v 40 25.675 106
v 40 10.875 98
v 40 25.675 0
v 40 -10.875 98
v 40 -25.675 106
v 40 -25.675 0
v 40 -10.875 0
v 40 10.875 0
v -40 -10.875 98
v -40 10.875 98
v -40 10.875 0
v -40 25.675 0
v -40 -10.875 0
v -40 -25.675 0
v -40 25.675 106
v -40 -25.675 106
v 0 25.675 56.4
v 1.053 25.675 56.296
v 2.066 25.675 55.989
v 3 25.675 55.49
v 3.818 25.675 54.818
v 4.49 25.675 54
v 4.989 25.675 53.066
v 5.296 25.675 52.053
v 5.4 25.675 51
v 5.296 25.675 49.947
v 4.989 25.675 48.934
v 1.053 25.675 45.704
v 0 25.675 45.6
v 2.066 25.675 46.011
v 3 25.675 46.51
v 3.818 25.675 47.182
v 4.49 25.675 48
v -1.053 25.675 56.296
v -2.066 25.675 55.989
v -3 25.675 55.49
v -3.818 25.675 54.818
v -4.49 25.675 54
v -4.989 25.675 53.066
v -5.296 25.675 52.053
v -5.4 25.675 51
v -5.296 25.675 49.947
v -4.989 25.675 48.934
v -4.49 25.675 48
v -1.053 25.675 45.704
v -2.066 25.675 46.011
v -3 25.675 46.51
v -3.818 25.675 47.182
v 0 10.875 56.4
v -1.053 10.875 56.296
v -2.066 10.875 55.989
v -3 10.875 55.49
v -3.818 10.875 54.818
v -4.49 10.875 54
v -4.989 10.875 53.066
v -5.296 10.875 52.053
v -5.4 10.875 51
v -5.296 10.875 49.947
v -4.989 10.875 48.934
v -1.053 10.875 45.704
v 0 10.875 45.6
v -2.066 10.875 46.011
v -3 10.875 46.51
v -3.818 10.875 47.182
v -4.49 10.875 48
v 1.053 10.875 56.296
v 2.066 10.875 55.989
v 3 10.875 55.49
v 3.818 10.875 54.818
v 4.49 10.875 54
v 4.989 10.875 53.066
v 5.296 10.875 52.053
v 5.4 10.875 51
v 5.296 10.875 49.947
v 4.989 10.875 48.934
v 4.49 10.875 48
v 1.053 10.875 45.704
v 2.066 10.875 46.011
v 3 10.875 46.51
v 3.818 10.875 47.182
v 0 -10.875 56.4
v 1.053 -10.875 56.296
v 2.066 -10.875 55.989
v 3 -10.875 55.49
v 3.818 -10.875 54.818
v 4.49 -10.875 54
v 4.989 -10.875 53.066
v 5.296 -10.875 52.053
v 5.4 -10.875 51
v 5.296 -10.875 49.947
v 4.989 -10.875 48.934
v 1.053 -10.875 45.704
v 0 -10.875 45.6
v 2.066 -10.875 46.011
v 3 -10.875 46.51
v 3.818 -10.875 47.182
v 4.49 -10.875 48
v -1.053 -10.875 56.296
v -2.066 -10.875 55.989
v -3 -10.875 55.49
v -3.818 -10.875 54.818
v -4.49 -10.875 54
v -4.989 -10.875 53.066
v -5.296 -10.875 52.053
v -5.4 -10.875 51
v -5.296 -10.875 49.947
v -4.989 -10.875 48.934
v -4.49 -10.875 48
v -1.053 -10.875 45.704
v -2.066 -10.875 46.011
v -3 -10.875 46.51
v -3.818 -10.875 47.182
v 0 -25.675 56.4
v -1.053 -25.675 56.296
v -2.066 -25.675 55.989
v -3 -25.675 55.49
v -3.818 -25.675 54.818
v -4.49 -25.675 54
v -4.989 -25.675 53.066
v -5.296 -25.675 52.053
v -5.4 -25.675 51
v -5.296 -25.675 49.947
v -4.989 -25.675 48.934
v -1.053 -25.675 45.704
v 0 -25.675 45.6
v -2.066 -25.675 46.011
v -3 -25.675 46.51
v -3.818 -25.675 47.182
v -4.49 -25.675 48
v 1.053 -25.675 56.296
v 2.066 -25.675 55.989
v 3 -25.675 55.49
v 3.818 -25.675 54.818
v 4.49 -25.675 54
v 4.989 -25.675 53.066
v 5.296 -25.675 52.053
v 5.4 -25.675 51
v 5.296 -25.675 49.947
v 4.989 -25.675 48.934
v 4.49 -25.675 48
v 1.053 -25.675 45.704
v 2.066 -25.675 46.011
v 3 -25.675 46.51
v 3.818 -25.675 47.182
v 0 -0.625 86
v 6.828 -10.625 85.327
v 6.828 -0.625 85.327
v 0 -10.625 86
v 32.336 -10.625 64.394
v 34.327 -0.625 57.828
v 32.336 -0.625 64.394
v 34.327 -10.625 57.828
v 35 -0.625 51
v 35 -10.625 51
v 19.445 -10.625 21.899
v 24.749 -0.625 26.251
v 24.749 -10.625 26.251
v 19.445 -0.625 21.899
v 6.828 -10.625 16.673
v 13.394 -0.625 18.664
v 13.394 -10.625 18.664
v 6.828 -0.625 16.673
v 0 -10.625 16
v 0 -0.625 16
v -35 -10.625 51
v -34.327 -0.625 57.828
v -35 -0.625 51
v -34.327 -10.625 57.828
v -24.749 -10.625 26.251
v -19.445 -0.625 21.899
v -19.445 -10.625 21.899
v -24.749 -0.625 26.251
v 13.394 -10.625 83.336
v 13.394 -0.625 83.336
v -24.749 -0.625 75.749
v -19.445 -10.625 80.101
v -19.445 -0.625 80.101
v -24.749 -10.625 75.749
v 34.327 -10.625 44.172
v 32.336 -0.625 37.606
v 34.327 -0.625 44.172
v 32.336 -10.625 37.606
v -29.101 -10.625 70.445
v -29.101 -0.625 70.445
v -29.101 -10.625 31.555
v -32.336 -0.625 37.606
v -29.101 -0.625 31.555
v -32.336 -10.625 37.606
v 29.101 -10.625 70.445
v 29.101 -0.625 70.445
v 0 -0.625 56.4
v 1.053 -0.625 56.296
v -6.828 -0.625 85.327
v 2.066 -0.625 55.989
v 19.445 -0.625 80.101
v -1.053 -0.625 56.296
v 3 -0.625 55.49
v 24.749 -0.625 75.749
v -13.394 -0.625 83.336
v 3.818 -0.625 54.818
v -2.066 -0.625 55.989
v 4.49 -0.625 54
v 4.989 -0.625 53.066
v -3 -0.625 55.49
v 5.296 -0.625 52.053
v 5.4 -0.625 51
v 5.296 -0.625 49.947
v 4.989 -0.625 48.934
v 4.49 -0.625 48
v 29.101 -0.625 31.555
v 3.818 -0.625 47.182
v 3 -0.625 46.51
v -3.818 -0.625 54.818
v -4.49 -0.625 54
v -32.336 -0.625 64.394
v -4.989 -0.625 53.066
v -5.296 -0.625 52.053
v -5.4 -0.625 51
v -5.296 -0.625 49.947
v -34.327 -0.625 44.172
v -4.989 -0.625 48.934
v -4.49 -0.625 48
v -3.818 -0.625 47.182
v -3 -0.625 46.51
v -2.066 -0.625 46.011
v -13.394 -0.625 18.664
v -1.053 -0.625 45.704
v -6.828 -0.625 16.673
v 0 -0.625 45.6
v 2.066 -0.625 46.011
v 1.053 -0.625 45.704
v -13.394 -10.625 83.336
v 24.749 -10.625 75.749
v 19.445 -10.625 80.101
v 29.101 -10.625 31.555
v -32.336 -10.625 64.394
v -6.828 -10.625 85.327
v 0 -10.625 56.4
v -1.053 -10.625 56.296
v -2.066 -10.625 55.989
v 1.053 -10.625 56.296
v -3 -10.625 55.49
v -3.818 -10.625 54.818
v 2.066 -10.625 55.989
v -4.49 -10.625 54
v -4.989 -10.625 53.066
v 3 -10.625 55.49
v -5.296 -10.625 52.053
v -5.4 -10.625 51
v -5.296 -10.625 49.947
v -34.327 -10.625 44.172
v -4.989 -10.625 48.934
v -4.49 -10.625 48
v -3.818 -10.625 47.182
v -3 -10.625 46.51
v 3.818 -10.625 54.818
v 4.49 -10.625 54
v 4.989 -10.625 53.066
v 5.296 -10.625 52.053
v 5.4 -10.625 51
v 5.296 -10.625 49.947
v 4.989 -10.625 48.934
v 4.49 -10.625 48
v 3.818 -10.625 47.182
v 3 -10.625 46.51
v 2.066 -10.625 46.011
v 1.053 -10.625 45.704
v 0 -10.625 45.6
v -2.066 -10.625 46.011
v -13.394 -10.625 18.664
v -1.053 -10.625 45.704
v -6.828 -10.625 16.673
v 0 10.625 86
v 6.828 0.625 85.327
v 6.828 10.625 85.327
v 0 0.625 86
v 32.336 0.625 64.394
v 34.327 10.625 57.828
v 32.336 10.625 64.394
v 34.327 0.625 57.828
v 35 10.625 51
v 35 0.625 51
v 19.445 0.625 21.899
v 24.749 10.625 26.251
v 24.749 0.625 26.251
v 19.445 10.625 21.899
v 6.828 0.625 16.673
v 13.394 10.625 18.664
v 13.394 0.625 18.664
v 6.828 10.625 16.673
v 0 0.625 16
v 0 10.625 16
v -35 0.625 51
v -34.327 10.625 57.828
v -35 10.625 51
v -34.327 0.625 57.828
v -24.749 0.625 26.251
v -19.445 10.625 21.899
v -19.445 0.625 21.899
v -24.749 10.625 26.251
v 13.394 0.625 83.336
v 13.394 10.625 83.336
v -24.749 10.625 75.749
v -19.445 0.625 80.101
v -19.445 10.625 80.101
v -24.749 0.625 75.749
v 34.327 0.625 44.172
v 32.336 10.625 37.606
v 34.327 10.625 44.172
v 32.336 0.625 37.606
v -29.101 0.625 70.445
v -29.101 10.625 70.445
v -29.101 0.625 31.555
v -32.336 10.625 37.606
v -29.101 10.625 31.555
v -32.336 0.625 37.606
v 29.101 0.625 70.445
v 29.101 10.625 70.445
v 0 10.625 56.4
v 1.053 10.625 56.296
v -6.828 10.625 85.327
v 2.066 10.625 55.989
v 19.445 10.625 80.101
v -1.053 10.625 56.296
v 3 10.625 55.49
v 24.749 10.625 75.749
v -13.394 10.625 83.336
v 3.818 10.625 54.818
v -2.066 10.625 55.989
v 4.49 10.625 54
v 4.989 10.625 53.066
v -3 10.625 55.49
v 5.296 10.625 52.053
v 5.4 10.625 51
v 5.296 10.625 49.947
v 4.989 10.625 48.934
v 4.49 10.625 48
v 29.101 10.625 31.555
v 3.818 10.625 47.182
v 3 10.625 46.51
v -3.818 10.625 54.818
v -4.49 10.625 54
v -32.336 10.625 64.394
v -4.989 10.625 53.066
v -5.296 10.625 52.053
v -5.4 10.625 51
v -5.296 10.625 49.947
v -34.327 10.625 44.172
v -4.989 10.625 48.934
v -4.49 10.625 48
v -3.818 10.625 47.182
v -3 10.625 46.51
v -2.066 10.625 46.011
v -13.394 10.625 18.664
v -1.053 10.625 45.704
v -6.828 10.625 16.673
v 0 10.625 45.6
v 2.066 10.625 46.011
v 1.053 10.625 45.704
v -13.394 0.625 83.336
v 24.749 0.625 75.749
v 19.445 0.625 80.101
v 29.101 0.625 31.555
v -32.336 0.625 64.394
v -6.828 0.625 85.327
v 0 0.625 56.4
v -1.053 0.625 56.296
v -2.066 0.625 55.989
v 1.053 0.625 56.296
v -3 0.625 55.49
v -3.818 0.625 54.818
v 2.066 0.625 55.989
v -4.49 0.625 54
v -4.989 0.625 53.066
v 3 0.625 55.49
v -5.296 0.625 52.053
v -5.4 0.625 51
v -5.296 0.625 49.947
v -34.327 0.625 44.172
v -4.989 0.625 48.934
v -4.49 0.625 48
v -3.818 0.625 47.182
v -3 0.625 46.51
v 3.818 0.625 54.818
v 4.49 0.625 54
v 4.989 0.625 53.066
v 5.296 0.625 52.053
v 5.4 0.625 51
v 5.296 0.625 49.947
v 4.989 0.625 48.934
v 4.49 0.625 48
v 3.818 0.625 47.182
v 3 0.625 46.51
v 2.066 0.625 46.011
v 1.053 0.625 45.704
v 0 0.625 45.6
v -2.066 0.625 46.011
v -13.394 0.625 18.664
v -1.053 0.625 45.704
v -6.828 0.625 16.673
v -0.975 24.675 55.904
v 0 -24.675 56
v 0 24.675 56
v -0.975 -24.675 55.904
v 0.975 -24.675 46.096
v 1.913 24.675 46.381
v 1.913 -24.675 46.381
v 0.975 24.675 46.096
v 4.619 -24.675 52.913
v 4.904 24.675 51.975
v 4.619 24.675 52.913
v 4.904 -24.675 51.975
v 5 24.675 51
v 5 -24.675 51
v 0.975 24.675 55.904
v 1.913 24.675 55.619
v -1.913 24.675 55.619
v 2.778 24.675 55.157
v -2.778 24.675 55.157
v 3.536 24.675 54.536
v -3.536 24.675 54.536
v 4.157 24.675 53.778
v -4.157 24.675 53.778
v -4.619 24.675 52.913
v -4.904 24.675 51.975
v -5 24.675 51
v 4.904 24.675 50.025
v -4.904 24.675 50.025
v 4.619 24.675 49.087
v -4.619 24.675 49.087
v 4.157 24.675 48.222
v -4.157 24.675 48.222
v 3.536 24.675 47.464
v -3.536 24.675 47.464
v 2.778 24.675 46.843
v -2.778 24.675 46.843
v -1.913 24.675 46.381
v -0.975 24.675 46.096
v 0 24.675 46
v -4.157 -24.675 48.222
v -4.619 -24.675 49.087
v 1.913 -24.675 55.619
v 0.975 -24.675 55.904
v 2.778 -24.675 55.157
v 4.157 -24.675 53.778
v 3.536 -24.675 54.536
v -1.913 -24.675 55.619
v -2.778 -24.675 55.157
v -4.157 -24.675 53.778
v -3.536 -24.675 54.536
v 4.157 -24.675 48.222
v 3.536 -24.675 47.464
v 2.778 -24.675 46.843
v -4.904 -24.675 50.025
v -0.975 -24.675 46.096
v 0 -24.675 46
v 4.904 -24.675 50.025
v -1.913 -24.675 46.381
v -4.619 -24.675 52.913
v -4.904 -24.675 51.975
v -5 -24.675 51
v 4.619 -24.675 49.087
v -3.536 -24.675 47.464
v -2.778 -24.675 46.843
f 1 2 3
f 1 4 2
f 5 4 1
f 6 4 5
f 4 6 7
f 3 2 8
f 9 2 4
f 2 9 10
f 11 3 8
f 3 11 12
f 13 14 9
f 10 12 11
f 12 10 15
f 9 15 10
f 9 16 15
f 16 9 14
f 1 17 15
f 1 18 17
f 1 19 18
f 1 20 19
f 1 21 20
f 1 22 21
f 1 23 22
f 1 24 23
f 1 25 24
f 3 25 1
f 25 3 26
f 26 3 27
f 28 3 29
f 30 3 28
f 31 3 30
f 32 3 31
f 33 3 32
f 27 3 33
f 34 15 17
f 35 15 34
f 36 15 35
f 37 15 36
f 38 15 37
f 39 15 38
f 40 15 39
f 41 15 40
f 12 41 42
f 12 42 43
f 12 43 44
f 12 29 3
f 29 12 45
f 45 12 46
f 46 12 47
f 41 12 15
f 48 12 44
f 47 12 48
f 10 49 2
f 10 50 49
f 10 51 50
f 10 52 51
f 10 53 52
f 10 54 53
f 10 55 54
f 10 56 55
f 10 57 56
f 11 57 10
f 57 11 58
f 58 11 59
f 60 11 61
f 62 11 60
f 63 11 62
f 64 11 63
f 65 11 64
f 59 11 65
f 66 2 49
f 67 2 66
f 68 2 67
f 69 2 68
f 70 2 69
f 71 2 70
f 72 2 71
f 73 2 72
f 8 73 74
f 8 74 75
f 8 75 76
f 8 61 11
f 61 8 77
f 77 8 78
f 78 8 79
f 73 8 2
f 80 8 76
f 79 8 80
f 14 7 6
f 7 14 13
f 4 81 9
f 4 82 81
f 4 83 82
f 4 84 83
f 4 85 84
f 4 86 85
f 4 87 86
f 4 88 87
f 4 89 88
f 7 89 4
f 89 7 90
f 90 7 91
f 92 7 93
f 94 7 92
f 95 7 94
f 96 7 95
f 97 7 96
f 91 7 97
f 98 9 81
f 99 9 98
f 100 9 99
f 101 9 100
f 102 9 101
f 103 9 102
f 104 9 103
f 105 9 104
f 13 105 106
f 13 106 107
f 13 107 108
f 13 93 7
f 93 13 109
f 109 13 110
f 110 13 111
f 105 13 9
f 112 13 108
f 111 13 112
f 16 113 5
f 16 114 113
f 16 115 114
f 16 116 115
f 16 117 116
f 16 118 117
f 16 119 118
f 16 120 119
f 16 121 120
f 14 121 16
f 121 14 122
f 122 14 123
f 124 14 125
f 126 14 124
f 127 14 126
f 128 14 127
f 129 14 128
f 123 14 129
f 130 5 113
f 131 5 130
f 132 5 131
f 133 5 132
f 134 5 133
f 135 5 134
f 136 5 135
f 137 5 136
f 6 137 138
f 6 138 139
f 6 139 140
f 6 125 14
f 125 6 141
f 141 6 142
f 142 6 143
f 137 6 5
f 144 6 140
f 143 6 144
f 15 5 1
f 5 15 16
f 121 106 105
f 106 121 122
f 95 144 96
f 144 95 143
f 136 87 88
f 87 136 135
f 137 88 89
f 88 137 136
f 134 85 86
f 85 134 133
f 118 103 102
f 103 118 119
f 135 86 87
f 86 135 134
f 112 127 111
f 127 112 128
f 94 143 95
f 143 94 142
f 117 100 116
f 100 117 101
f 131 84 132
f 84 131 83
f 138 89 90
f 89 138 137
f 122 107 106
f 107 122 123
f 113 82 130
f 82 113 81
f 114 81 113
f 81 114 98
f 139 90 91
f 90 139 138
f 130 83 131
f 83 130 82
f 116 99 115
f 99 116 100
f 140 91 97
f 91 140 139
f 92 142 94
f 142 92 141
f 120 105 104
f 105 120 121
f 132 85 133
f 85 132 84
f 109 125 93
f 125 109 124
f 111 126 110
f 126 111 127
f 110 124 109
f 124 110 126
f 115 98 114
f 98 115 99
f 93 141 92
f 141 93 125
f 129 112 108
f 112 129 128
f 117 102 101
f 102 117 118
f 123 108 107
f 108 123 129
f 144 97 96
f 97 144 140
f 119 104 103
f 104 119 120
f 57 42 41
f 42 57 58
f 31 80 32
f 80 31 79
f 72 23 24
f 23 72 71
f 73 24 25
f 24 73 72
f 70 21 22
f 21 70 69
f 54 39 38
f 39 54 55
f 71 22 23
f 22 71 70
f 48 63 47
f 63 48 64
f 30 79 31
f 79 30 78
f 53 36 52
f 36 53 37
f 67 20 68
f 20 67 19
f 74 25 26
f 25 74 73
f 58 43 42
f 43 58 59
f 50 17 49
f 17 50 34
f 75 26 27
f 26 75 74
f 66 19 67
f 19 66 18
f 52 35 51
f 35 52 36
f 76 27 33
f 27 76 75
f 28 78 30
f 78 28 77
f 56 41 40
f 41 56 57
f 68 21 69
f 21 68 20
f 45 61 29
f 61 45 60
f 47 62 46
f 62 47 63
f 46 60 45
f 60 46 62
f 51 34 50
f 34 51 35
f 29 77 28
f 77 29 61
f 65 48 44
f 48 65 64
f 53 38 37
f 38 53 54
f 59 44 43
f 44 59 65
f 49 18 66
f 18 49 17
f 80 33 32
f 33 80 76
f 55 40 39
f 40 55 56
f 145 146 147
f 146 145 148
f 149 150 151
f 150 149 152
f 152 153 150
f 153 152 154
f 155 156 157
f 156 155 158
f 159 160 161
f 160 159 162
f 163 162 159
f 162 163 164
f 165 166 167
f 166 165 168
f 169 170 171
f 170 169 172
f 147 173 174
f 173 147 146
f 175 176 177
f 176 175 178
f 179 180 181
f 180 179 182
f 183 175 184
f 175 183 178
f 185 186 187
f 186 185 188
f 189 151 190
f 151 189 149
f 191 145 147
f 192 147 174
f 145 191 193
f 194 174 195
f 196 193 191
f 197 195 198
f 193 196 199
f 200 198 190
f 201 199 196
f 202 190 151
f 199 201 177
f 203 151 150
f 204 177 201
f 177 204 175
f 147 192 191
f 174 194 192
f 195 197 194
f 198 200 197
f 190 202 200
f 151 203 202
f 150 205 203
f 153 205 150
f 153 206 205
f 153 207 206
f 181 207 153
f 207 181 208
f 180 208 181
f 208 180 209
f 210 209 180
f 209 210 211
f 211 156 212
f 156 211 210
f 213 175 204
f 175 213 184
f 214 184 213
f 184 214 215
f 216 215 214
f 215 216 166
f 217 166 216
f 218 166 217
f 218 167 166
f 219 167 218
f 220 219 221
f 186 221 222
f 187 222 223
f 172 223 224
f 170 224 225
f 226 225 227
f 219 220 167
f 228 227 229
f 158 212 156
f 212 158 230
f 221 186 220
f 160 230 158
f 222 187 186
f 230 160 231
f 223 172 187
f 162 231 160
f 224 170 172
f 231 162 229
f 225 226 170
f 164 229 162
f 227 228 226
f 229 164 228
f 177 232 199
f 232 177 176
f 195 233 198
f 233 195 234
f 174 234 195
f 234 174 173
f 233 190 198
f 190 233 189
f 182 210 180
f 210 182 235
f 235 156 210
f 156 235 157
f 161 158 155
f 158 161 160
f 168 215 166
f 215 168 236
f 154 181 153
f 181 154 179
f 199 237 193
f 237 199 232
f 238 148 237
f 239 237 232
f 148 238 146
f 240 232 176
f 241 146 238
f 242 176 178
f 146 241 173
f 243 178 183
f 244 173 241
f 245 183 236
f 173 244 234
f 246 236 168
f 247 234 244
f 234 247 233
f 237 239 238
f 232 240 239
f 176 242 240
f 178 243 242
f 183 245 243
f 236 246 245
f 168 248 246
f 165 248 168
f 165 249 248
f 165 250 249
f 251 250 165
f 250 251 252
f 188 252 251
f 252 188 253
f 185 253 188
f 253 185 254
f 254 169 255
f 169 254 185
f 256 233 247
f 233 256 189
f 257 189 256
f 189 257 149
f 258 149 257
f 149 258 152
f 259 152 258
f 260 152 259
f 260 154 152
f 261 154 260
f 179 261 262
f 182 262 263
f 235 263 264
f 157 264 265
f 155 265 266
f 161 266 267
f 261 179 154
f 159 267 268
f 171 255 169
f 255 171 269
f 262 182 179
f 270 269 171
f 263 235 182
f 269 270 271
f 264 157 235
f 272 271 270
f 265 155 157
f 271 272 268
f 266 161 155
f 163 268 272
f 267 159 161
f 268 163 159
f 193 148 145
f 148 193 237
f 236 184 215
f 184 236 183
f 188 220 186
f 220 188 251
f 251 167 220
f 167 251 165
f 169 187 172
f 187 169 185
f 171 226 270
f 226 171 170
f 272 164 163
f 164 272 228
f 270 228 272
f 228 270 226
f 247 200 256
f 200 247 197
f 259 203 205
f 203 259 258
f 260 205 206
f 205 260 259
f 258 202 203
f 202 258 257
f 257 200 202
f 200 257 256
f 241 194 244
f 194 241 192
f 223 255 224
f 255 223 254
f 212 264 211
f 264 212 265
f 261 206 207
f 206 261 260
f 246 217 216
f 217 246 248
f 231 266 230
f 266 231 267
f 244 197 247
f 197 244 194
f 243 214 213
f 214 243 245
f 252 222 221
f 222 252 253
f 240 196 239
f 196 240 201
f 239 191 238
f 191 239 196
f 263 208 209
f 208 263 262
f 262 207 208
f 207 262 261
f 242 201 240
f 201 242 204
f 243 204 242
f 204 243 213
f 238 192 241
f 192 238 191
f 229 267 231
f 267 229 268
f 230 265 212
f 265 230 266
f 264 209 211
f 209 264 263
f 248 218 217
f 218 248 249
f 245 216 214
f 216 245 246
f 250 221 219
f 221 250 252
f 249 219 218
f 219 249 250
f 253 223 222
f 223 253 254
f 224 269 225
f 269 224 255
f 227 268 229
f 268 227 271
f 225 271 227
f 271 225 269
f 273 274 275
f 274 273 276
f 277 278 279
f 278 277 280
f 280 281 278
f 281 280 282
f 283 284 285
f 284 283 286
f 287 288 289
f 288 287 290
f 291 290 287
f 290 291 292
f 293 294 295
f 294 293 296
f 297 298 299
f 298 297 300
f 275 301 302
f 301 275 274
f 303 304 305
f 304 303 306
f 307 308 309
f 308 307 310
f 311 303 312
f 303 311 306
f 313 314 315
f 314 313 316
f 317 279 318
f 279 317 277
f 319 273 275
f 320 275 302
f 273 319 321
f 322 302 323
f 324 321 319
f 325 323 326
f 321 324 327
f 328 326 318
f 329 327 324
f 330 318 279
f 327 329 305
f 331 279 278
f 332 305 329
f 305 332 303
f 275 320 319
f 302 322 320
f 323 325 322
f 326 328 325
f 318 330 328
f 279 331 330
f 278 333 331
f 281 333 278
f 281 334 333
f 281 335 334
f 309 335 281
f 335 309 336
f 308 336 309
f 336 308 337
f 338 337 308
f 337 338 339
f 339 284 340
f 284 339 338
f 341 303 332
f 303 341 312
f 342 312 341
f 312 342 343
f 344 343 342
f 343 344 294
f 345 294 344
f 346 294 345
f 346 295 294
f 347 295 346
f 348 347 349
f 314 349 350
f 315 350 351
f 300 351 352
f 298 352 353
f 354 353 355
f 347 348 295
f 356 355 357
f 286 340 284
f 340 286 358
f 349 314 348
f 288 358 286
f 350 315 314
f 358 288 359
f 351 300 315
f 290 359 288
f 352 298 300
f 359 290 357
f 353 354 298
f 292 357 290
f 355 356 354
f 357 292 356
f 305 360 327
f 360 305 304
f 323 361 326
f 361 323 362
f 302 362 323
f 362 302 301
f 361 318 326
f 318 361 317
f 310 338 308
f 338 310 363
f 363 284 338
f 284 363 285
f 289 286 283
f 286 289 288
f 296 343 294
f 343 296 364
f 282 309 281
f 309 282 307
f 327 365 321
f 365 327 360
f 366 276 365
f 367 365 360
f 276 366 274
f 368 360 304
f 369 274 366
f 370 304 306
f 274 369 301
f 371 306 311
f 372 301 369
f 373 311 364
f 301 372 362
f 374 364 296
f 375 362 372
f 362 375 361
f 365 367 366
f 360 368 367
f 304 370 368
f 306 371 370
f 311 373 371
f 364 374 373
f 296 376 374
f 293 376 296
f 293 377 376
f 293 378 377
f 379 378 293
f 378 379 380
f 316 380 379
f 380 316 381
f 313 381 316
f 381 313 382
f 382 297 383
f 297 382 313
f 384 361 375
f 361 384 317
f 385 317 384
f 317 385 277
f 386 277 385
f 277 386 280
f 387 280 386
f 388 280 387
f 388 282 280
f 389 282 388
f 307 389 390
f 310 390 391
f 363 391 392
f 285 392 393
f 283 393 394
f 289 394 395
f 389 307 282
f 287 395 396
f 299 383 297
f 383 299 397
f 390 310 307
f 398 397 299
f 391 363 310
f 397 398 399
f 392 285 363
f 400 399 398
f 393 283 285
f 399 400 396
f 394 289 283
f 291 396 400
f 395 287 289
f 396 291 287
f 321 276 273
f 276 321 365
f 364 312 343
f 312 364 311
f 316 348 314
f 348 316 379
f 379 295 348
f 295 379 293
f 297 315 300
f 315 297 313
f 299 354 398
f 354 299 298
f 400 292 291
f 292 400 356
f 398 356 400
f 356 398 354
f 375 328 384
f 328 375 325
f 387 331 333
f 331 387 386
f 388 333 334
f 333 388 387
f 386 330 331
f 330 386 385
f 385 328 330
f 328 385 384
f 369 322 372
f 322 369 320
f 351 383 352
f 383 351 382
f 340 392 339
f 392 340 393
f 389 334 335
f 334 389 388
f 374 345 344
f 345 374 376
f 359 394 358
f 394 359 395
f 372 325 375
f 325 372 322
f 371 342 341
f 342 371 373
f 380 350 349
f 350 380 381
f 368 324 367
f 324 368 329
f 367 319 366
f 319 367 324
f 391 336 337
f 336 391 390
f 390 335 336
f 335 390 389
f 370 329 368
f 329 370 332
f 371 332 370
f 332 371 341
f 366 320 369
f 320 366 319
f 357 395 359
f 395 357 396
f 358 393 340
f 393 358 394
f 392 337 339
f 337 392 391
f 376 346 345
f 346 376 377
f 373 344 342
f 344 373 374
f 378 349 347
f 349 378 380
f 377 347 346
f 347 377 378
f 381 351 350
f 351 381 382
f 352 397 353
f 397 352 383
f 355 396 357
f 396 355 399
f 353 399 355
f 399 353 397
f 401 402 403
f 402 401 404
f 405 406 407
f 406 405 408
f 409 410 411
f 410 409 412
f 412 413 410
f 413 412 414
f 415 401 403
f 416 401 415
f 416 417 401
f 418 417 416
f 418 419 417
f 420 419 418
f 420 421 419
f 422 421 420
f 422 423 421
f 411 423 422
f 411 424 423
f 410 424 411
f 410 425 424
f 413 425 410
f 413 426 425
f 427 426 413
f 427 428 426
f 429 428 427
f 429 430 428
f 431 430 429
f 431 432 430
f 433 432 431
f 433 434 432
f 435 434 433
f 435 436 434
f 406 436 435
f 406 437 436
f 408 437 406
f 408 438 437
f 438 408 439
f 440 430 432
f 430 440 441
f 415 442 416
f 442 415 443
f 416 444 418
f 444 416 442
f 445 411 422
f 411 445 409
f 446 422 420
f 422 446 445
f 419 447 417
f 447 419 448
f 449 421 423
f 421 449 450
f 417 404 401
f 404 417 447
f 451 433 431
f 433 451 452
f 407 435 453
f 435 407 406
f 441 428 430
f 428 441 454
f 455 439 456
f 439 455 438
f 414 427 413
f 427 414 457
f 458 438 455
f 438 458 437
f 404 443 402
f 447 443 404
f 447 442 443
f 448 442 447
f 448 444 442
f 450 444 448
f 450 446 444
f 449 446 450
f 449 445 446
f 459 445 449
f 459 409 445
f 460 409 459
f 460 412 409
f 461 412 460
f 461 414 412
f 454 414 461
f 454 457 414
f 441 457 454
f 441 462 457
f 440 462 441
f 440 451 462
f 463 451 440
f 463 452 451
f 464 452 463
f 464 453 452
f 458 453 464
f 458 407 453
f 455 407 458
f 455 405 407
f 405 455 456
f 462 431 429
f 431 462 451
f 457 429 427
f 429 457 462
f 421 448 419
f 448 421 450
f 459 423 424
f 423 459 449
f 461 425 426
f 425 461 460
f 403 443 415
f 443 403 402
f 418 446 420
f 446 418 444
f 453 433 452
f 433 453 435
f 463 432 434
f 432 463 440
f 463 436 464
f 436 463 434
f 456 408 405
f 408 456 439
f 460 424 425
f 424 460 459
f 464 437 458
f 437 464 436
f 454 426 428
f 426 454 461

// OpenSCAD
$fn = 32;

// ------------------------------------------------------------------------
// Trolley wheel set: wheels d70, fork 98 mm tall
// Every part is its own module, assembly() places every instance.
// ------------------------------------------------------------------------

// --- part 1 ---
module trolley_fork() {
  difference() {
    union() {
      translate([-40, 10.875, 0]) cube([80, 14.8, 98]);
      translate([-40, -25.675, 0]) cube([80, 14.8, 98]);
      translate([-40, -25.675, 98]) cube([80, 51.35, 8]);
    }
    translate([0, -18.275, 51]) rotate([90, 0, 0]) cylinder(h = 16.8, d = 10.8, center = true);
    translate([0, 18.275, 51]) rotate([90, 0, 0]) cylinder(h = 16.8, d = 10.8, center = true);
  }
}

// --- part 2 ---
module trolley_wheel() {
  difference() {
      translate([0, 0, 0]) cylinder(h = 10, d = 70);
      translate([0, 0, -1]) cylinder(h = 12, d = 10.8);
    }
}

// --- part 3 ---
module trolley_axle() {
  translate([0, 0, -24.675]) cylinder(h = 49.35, d = 10);
}

// --- assembly ---
module assembly() {
  color([0.80, 0.24, 0.20]) translate([0, 0, 0]) rotate([0, 0, 0]) trolley_fork();
  color([0.20, 0.45, 0.75]) translate([0, -0.625, 51]) rotate([90, 0, 0]) trolley_wheel();
  color([0.25, 0.62, 0.32]) translate([0, 10.625, 51]) rotate([90, 0, 0]) trolley_wheel();
  color([0.92, 0.70, 0.18]) translate([0, 0, 51]) rotate([90, 0, 0]) trolley_axle();
}

assembly();
